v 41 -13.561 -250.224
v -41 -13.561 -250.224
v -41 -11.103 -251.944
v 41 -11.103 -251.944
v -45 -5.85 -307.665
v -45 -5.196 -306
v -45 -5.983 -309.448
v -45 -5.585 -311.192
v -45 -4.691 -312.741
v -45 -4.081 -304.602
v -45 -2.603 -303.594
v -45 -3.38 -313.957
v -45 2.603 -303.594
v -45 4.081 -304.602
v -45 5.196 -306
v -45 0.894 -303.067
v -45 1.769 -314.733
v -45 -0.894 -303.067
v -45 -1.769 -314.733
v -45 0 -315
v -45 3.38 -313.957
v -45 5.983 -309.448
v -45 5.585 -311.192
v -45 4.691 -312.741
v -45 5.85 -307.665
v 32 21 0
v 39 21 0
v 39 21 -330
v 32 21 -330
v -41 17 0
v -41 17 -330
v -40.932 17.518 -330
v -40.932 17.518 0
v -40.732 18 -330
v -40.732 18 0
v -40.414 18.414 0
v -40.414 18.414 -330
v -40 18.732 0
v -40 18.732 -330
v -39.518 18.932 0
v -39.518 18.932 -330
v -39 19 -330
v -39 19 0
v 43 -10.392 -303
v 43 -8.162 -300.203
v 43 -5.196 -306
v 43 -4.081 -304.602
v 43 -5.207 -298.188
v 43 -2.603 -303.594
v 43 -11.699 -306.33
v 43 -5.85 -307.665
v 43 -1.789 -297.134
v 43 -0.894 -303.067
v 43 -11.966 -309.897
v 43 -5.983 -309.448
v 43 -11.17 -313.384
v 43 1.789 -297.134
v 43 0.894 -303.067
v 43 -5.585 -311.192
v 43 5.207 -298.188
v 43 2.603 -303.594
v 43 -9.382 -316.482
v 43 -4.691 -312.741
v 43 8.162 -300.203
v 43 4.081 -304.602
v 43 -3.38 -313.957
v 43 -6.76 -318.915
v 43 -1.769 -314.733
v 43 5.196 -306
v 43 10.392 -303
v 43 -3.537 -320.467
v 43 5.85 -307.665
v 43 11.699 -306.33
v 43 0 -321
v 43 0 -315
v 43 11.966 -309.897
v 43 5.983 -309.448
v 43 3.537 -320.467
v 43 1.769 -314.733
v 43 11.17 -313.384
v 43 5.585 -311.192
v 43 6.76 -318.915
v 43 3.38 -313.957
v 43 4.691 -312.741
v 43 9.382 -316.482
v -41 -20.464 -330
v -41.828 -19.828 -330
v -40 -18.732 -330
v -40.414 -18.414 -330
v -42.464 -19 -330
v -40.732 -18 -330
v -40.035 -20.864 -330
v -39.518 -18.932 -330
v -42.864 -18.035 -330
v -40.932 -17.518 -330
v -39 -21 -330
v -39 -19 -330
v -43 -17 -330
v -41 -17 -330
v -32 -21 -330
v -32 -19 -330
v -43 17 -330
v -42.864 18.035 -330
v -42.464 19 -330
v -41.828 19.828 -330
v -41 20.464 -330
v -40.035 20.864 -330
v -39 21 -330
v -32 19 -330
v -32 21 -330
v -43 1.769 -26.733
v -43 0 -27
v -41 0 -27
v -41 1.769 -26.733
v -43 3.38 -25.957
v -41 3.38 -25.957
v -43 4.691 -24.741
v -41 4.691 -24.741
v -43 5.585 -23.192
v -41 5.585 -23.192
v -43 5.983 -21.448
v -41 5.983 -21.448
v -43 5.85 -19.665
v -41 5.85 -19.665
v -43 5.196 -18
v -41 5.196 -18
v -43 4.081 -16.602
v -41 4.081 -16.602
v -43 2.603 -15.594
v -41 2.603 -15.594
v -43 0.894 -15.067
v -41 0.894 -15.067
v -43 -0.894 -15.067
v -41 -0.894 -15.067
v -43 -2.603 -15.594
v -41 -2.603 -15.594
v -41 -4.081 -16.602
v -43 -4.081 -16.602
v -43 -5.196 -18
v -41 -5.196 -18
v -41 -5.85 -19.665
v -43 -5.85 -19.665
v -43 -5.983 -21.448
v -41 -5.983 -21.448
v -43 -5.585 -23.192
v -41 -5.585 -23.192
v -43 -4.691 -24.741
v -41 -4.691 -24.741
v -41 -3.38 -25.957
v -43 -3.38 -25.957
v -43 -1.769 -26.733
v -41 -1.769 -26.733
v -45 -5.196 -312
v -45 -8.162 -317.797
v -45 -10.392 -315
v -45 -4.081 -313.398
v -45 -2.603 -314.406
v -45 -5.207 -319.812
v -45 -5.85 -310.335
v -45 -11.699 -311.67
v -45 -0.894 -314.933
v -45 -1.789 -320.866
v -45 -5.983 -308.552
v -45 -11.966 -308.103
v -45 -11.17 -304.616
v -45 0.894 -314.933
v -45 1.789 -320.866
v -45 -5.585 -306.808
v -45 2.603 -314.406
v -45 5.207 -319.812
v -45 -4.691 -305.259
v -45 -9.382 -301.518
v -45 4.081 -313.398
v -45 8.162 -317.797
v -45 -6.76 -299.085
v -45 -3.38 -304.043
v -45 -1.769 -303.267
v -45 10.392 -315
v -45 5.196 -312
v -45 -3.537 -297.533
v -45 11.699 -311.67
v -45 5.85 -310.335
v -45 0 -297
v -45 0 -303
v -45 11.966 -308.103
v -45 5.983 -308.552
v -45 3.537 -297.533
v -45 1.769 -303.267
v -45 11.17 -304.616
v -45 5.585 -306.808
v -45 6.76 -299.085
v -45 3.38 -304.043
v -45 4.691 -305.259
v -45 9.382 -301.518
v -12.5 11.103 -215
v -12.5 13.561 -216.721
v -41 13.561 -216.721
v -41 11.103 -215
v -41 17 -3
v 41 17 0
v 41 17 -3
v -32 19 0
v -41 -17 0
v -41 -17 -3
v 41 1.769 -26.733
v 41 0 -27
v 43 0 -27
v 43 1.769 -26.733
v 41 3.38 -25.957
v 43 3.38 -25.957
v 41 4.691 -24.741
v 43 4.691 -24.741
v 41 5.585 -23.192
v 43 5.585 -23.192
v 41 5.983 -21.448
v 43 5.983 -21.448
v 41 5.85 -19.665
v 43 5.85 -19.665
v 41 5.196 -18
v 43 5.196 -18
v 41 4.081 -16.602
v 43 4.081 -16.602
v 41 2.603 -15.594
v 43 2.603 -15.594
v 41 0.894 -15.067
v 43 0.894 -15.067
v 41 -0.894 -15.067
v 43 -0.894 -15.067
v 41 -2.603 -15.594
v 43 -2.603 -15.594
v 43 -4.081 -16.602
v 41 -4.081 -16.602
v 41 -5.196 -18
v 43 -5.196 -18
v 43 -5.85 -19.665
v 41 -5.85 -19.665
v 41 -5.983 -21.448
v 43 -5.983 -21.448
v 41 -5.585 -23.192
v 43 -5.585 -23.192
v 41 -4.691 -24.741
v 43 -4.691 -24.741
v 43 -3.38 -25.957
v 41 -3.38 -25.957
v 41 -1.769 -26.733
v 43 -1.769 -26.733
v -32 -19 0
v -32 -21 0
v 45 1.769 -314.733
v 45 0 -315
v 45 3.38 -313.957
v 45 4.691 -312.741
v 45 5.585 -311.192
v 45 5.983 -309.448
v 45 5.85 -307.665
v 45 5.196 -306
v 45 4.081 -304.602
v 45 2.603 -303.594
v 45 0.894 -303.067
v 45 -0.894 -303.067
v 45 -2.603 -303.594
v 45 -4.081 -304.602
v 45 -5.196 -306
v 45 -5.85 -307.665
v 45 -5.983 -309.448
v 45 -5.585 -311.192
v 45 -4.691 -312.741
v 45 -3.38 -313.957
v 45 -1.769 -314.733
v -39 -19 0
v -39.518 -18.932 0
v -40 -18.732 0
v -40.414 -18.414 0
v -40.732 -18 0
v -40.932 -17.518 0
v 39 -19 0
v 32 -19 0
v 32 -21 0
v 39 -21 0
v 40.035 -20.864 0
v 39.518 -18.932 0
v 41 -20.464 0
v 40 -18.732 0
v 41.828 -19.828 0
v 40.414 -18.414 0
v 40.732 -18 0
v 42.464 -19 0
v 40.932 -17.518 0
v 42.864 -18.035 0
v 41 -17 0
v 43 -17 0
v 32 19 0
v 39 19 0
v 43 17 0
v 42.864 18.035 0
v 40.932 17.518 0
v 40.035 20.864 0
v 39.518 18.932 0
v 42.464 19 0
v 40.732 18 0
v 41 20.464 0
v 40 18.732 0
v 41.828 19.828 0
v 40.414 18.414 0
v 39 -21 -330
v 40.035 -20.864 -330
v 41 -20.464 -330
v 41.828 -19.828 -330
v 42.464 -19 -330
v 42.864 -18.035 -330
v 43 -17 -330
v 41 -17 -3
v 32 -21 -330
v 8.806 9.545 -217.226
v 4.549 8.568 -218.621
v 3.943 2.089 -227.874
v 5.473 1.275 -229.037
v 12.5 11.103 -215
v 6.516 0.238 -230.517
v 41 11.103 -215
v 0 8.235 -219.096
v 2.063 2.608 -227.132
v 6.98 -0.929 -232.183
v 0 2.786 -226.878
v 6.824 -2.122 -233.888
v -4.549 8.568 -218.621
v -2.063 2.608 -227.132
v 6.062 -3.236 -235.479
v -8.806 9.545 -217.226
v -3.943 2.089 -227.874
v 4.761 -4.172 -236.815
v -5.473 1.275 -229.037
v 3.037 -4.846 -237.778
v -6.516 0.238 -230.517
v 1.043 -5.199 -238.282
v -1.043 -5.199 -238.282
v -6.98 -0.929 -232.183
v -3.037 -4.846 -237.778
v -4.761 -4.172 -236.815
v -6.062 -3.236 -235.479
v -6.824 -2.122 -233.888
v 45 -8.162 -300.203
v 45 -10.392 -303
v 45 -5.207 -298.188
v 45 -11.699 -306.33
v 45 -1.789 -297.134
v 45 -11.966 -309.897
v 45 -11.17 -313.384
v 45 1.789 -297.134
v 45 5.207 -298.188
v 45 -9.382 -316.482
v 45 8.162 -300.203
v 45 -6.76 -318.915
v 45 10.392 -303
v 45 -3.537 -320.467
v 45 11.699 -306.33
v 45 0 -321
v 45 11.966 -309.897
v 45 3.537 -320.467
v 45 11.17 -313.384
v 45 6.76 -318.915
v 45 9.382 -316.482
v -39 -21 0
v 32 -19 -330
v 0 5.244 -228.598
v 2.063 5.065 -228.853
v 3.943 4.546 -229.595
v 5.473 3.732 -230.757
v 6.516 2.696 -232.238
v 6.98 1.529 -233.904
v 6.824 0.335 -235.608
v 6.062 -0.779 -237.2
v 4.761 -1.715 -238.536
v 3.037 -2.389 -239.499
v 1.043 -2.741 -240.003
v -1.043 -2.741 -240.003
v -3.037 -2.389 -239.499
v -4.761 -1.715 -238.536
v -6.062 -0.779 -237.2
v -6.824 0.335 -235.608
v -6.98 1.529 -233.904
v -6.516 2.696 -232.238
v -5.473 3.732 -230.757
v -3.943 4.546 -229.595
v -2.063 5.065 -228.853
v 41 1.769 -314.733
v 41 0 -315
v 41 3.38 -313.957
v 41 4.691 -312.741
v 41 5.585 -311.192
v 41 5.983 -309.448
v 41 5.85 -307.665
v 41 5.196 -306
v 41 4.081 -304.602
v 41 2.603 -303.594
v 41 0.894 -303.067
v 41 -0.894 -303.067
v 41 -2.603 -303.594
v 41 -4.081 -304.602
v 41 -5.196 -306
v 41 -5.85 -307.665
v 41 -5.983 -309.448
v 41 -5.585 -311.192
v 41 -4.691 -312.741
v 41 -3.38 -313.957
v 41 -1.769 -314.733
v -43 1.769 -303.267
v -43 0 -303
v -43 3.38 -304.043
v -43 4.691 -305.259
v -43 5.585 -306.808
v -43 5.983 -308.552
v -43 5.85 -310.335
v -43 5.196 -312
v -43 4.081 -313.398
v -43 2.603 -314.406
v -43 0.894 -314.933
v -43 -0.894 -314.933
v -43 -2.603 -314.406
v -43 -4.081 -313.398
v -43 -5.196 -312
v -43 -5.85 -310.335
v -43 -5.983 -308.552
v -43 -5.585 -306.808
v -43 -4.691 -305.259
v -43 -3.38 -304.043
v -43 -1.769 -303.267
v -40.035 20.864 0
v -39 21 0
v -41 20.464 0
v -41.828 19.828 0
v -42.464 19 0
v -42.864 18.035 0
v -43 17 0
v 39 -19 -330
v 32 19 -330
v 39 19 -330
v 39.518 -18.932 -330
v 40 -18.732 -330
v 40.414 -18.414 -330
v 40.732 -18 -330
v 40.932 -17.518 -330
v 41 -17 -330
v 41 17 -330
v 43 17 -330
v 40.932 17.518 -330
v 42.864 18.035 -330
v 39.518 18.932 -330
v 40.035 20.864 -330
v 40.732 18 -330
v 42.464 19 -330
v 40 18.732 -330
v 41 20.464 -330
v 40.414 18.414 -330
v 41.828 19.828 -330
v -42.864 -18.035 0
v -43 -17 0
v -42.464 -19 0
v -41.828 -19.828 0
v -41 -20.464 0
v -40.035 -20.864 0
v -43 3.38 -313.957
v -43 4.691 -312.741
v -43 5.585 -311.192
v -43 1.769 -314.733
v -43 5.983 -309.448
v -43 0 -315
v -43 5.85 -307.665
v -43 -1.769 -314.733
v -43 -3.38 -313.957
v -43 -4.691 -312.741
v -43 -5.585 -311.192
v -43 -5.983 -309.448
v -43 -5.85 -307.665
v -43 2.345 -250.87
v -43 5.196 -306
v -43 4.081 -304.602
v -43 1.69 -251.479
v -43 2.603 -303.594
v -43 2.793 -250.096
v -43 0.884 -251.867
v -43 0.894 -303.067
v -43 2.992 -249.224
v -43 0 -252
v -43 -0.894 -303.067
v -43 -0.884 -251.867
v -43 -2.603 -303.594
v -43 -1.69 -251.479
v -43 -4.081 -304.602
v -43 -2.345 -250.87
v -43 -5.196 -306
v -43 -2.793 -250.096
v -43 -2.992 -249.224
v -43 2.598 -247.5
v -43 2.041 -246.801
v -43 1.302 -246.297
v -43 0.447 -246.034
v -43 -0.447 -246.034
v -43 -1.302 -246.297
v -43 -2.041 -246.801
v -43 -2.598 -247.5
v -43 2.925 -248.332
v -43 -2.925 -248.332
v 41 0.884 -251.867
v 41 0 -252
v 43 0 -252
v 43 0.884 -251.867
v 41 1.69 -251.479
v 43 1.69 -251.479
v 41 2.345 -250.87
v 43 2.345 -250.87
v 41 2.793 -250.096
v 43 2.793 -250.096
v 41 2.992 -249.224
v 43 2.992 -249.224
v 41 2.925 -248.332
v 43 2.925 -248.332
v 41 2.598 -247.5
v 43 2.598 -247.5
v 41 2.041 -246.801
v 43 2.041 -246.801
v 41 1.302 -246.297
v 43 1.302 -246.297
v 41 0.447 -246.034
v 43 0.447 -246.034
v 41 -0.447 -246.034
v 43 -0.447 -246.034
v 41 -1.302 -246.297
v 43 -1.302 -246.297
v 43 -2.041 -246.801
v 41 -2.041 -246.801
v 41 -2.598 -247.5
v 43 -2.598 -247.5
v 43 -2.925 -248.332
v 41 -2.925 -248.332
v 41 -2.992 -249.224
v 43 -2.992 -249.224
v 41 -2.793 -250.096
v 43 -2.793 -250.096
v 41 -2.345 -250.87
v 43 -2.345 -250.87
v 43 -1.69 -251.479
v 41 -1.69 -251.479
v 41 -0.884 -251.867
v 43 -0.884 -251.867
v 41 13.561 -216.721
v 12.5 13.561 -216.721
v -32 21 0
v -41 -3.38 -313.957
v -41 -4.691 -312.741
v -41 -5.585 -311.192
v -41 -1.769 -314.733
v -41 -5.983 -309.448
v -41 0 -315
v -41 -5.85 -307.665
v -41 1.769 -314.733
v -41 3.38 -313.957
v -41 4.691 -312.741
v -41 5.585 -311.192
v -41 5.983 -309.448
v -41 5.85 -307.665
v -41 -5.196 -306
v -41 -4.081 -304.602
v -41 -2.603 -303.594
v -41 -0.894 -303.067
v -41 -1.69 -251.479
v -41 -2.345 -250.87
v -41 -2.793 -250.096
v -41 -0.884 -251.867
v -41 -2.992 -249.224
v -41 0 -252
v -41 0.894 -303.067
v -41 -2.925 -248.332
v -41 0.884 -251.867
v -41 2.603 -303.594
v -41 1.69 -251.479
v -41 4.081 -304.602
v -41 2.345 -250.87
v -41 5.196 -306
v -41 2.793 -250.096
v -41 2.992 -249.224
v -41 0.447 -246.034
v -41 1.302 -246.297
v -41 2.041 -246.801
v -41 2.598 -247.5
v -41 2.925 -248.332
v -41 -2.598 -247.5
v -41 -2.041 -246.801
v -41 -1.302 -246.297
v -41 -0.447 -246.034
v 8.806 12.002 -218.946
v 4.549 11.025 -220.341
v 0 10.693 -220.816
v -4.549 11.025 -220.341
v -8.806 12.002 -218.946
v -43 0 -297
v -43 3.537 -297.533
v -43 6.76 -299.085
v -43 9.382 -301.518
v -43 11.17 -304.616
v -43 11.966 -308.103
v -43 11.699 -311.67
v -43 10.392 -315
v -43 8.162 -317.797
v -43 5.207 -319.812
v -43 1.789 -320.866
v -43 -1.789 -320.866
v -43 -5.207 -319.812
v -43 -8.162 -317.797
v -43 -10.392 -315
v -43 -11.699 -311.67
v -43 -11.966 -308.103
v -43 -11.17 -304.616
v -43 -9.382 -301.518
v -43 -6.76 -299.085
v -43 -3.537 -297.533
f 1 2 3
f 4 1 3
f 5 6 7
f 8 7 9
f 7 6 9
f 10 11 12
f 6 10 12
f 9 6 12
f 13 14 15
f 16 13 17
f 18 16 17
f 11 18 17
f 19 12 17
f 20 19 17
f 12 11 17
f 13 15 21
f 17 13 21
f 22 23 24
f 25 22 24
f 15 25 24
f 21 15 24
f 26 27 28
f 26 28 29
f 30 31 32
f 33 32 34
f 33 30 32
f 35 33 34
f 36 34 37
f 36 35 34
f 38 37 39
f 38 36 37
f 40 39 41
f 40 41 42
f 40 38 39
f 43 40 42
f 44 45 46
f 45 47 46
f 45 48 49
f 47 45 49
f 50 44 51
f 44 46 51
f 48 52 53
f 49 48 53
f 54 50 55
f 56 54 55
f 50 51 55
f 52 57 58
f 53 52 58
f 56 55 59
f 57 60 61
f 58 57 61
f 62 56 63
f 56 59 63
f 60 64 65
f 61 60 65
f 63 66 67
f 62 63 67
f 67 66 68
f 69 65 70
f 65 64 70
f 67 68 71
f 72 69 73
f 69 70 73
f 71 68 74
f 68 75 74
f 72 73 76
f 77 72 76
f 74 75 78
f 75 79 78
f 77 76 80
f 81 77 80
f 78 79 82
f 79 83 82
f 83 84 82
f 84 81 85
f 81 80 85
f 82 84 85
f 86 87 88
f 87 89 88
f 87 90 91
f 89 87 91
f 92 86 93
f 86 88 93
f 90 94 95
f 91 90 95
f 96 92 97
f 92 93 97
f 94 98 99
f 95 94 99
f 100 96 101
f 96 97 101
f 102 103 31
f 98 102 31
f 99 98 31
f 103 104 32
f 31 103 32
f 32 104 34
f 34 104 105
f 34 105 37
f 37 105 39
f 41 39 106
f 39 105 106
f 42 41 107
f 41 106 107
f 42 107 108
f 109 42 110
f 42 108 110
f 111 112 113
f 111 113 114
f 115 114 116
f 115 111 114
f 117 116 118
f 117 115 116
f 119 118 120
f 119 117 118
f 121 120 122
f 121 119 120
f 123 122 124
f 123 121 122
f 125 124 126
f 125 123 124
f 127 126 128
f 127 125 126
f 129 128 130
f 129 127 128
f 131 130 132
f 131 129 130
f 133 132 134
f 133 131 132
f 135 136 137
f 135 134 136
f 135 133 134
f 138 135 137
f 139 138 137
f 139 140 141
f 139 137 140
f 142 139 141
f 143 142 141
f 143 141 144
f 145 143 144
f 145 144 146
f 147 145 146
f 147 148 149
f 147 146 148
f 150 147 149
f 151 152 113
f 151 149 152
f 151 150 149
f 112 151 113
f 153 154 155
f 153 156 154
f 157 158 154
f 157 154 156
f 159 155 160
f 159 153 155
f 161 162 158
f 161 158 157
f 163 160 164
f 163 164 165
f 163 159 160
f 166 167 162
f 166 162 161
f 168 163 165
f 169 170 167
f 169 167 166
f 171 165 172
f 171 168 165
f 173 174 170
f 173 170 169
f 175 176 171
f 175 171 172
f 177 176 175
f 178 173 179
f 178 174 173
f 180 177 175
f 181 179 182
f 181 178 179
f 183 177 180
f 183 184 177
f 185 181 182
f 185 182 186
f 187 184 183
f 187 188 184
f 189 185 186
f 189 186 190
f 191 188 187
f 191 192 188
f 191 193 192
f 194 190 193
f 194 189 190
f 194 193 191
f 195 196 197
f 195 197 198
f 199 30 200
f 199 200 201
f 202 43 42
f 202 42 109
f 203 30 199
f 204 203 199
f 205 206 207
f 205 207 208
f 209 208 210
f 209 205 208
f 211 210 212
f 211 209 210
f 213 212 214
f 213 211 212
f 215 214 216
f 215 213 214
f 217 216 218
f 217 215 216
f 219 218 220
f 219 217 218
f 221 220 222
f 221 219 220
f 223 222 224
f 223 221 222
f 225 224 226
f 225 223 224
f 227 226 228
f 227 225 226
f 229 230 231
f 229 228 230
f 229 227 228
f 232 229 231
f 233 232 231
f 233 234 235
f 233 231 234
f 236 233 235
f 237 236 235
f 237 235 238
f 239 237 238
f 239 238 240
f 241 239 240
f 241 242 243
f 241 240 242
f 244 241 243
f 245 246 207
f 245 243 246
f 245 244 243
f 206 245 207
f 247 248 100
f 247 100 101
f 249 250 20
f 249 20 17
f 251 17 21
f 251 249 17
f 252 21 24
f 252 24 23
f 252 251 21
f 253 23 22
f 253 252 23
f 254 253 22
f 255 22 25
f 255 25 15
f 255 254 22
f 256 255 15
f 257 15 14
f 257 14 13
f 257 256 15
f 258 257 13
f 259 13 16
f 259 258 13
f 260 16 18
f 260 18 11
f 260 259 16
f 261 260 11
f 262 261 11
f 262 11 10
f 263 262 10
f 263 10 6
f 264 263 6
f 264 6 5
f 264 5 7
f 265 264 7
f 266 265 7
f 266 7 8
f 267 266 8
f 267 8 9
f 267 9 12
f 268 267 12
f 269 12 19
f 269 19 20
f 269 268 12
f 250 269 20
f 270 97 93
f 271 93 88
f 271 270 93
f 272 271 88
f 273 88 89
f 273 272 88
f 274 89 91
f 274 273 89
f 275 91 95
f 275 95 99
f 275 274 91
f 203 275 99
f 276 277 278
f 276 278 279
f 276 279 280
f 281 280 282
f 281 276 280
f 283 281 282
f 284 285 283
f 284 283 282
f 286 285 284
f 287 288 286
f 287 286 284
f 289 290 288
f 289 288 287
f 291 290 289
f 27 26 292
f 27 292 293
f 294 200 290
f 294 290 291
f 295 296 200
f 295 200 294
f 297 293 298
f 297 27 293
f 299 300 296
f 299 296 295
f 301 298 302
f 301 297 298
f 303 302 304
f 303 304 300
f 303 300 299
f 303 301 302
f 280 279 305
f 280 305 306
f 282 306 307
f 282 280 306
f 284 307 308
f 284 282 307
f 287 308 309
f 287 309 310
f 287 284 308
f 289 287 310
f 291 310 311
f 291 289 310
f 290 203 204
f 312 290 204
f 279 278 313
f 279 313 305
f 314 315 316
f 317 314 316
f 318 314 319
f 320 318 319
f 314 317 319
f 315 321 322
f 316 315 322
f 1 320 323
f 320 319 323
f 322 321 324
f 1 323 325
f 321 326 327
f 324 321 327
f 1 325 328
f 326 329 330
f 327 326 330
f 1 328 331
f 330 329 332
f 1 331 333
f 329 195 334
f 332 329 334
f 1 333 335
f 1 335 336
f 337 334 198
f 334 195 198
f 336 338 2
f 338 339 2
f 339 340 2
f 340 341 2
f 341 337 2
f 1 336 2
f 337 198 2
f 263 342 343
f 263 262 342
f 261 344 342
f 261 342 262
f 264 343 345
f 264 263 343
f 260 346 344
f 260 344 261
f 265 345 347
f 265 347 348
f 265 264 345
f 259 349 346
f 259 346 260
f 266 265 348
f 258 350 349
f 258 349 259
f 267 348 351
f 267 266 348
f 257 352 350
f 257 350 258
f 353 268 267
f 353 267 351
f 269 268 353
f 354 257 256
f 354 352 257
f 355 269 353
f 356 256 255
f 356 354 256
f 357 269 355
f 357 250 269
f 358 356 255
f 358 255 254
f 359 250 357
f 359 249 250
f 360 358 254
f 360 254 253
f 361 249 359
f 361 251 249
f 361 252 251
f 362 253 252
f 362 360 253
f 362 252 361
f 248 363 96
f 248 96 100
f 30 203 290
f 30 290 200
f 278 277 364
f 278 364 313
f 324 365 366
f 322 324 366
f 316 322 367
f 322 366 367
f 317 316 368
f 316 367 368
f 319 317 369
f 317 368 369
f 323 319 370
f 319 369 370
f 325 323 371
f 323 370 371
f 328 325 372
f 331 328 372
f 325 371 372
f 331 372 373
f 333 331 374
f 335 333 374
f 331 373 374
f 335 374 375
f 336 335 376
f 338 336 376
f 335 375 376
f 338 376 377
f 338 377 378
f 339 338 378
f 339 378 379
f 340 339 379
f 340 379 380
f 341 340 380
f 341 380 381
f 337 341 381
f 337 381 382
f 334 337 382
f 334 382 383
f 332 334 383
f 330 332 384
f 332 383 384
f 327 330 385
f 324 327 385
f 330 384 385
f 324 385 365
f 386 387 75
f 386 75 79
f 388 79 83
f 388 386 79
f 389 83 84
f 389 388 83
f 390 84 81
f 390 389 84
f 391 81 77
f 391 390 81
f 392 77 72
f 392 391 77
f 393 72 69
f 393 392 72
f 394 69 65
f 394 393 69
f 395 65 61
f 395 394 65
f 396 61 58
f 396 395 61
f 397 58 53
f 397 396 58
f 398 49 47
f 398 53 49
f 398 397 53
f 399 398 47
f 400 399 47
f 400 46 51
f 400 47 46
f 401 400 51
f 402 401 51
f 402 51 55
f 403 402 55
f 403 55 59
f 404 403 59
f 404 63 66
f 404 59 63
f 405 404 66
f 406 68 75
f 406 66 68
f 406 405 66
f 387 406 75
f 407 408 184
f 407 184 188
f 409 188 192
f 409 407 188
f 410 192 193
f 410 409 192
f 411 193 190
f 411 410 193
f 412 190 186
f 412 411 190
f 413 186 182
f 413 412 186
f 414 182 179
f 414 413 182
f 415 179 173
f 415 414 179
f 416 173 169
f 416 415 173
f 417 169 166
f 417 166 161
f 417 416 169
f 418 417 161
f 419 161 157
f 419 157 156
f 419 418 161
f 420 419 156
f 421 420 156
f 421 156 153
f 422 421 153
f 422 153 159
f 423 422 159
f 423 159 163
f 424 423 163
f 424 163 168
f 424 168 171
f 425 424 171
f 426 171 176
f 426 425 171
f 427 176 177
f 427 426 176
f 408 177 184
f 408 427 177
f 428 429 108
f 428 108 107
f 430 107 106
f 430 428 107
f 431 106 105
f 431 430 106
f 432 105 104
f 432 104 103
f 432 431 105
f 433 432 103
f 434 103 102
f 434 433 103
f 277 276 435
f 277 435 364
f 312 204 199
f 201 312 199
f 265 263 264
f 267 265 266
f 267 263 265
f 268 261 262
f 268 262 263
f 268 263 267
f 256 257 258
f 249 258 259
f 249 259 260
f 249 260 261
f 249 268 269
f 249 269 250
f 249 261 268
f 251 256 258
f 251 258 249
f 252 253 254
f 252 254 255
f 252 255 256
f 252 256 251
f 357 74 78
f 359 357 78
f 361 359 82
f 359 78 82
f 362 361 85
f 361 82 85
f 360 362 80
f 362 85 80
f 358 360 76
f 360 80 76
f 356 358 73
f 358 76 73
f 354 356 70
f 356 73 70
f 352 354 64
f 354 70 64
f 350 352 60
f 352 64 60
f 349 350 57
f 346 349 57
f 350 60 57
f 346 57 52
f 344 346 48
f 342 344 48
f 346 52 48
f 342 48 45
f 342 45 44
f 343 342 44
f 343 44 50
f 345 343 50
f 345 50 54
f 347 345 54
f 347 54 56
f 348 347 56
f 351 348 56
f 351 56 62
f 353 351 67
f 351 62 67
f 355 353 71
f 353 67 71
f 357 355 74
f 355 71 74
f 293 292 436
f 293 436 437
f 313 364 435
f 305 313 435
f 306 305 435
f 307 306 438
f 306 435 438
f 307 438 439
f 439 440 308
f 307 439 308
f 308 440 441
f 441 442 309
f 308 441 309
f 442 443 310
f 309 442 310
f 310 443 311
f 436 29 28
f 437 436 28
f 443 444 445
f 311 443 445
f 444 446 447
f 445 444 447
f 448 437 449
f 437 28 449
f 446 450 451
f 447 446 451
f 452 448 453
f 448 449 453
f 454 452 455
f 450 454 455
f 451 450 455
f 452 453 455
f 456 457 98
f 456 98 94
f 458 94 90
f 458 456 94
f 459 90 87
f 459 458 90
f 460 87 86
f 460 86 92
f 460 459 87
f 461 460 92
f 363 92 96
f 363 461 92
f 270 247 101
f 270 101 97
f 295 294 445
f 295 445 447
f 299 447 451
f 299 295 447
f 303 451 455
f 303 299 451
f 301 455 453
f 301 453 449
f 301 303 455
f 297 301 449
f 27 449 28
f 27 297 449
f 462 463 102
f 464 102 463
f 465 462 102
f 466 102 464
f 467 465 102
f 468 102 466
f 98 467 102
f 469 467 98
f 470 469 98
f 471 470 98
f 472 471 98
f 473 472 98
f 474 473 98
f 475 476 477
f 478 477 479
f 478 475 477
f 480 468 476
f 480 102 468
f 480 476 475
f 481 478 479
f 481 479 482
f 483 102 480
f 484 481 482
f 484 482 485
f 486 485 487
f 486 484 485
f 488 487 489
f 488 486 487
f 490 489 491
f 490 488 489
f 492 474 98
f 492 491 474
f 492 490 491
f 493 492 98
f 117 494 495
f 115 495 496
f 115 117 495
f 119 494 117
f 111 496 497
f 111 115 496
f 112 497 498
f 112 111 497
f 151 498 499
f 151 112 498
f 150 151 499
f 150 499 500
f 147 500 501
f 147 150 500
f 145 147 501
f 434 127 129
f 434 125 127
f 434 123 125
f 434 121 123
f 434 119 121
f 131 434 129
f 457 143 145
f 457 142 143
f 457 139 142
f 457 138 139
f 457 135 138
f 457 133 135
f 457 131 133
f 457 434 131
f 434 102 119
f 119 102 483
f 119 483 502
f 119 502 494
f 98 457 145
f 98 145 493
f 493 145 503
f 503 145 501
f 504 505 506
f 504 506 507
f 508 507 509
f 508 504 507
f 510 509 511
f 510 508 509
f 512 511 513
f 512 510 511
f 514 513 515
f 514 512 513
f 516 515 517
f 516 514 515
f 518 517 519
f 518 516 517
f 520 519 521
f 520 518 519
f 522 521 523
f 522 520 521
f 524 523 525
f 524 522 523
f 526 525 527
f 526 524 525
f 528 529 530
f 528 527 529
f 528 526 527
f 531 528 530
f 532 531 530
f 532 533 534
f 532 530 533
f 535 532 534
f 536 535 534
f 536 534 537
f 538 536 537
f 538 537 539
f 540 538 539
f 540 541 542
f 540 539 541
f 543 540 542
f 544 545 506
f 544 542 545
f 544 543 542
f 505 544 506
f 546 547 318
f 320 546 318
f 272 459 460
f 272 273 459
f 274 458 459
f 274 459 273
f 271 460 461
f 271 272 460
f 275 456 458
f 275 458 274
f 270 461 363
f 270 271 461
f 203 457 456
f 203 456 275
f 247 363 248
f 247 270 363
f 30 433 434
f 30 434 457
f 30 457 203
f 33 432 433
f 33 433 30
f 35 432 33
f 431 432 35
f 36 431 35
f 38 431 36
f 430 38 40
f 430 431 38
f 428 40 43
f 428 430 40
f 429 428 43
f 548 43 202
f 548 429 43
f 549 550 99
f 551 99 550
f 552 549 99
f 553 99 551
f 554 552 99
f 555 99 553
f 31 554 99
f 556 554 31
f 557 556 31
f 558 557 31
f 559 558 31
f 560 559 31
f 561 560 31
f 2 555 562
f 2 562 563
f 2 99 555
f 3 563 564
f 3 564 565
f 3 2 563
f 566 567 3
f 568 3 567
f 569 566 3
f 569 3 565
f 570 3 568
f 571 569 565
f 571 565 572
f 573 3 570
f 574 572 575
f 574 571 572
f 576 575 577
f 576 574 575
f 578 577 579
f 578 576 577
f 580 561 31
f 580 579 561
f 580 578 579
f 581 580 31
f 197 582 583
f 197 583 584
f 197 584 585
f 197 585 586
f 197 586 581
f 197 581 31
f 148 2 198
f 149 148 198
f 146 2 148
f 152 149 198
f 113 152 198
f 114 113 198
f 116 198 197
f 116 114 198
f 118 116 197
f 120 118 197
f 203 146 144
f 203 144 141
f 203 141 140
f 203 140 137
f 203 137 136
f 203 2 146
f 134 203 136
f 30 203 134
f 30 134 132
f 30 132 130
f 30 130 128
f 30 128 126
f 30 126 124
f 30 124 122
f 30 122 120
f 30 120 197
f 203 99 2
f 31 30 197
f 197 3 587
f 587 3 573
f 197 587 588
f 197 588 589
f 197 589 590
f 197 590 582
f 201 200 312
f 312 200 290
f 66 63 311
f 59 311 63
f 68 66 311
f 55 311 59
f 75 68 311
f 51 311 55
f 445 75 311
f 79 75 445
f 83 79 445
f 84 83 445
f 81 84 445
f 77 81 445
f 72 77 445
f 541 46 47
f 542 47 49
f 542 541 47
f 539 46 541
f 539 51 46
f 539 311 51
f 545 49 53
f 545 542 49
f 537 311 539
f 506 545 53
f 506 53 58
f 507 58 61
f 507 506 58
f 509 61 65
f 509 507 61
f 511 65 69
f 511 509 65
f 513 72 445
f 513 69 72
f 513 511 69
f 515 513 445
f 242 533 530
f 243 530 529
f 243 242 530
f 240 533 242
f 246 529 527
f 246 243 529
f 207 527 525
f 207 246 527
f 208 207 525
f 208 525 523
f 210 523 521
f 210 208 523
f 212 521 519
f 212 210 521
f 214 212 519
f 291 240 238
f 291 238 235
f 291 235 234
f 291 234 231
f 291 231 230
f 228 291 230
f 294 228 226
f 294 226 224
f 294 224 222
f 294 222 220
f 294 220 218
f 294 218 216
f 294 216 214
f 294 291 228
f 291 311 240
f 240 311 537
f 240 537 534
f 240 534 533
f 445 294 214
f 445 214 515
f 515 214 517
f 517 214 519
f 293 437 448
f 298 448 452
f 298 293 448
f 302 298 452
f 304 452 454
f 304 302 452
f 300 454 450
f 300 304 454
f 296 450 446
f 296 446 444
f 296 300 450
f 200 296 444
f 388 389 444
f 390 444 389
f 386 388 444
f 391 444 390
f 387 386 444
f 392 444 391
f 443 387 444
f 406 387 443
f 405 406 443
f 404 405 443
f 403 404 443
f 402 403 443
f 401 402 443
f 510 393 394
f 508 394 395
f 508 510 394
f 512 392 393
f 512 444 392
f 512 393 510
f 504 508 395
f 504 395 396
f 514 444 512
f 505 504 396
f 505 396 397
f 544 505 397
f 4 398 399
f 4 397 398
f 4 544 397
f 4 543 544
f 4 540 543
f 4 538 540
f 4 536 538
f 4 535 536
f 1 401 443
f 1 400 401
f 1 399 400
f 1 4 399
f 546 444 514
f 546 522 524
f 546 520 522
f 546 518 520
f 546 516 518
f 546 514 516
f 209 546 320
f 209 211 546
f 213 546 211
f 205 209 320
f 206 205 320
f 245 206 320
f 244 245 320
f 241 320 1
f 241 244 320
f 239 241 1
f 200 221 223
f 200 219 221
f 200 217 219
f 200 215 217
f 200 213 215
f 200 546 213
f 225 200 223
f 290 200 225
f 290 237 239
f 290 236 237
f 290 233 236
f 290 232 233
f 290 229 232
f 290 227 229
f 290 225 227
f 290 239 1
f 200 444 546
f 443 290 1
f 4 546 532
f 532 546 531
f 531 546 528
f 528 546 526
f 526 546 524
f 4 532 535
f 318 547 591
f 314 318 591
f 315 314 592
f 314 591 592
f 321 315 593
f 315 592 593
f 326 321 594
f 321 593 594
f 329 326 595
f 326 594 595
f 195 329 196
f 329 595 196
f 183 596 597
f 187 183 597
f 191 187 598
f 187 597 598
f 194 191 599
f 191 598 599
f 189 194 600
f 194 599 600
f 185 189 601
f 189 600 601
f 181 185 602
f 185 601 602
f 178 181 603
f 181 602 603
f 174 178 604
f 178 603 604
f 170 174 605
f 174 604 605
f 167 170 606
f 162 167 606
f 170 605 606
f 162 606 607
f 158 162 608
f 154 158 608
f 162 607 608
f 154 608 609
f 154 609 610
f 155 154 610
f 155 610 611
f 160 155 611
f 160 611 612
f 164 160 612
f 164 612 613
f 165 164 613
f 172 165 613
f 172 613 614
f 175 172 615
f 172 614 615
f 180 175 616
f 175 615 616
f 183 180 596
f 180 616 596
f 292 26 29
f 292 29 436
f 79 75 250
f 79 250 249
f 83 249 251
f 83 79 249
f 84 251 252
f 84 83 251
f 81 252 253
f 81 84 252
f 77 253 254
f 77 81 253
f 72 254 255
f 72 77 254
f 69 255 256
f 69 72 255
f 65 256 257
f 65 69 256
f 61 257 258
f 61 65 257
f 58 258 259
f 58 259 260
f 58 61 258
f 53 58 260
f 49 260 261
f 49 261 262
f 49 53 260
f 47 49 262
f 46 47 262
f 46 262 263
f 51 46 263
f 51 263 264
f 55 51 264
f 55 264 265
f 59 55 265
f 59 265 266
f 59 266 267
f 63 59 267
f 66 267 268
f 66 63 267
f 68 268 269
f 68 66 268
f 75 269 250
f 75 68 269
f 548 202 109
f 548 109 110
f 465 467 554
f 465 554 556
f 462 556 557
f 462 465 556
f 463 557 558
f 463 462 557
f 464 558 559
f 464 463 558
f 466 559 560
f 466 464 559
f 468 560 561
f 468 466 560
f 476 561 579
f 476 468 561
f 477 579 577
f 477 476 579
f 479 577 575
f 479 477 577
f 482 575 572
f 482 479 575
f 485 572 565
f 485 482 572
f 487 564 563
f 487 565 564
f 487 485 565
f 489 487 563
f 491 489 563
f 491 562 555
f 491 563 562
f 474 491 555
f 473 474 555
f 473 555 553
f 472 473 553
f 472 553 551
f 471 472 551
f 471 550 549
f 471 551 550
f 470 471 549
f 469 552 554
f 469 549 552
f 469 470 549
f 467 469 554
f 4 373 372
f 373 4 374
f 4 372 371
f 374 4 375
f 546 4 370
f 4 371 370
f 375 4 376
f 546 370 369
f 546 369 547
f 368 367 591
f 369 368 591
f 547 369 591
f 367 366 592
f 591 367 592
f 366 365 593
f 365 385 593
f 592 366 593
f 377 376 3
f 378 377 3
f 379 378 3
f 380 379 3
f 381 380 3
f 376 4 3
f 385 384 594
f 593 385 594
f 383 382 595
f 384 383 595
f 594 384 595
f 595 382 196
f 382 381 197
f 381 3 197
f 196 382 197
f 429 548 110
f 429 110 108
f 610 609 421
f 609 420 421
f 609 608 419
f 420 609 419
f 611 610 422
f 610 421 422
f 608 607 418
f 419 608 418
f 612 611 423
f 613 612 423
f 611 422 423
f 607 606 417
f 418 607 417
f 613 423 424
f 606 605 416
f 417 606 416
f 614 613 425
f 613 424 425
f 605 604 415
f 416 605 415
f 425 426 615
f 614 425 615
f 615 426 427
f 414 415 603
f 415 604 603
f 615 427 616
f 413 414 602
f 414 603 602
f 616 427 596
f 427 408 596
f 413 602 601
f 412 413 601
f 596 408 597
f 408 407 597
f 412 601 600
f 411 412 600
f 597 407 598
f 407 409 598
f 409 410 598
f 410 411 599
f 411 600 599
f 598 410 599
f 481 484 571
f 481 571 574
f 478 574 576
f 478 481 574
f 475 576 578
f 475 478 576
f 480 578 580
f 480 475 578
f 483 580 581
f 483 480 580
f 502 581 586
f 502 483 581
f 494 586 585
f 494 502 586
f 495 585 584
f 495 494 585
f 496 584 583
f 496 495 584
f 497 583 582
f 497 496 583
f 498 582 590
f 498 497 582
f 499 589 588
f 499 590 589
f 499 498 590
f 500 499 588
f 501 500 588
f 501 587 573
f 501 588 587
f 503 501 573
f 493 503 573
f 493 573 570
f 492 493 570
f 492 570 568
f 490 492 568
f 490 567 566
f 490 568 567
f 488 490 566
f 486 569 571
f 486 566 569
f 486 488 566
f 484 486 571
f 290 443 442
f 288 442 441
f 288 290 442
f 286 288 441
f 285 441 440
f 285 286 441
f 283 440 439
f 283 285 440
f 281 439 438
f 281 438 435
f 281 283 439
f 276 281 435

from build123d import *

# Parameters (mm, degrees)
EXTRUDE_1_DEPTH          = 330
EXTRUDE_1_2_DEPTH        = 330
EXTRUDE_2_REACH          = 343.17
SKETCH_3_W               = 3
SKETCH_3_H               = 34
EXTRUDE_3_REACH          = 343.17
CUT_EXTRUDE_1_DEPTH      = 342.667967477
CUT_EXTRUDE_1_DEPTH_BACK = 342.667967477
SKETCH_5_R               = 6
SKETCH_5_R_2             = 3
SKETCH_6_R               = 7
CUT_EXTRUDE_2_DEPTH      = 3
SKETCH_7_R               = 12
SKETCH_7_R_2             = 6
EXTRUDE_4_DEPTH          = 2
SKETCH_8_R               = 6
EXTRUDE_5_DEPTH          = 90
SKETCH_9_R               = 12
SKETCH_9_R_2             = 6
EXTRUDE_6_DEPTH          = 2


with BuildPart() as part:
    # Эскиз2 → Бобышка-Вытянуть1 (new body)
    with BuildSketch(Plane.XY):
        with BuildLine():
            Line((43, -17), (43, 17))
            ThreePointArc((43, 17), (41.828427125, 19.828427125), (39, 21))
            Line((39, 21), (32, 21))
            Line((32, 21), (32, 19))
            Line((32, 19), (39, 19))
            ThreePointArc((39, 19), (40.414213562, 18.414213562), (41, 17))
            Line((41, 17), (41, -17))
            ThreePointArc((41, -17), (40.414213562, -18.414213562), (39, -19))
            Line((39, -19), (32, -19))
            Line((32, -19), (32, -21))
            Line((32, -21), (39, -21))
            ThreePointArc((39, -21), (41.828427125, -19.828427125), (43, -17))
        make_face()
    extrude(amount=-EXTRUDE_1_DEPTH)


with BuildPart() as body_2:
    # Эскиз2 → Extrude 1 2 (new body)
    with BuildSketch(Plane.XY):
        with BuildLine():
            Line((-32, 19), (-32, 21))
            Line((-32, 21), (-39, 21))
            ThreePointArc((-39, 21), (-41.828427125, 19.828427125), (-43, 17))
            Line((-43, 17), (-43, -17))
            ThreePointArc((-43, -17), (-41.828427125, -19.828427125), (-39, -21))
            Line((-39, -21), (-32, -21))
            Line((-32, -21), (-32, -19))
            Line((-32, -19), (-39, -19))
            ThreePointArc((-39, -19), (-40.414213562, -18.414213562), (-41, -17))
            Line((-41, -17), (-41, 17))
            ThreePointArc((-41, 17), (-40.414213562, 18.414213562), (-39, 19))
            Line((-39, 19), (-32, 19))
        make_face()
    extrude(amount=-EXTRUDE_1_2_DEPTH)


with BuildPart() as body_3:

    # Эскиз3 → Бобышка-Вытянуть2 (new, up to next)
    with BuildSketch(Plane(origin=(-41, 0, 0), x_dir=(0, 0, -1), z_dir=(1, 0, 0)), mode=Mode.PRIVATE) as extrude_2_sk1:
        with Locations((1.5, 0)):
            Rectangle(SKETCH_3_W, SKETCH_3_H)
    extrude_2_tool1 = extrude(extrude_2_sk1.sketch, amount=EXTRUDE_2_REACH, mode=Mode.PRIVATE) - part.part
    add(extrude_2_tool1.solids().sort_by_distance((-41, 0, -1.5))[0])


with BuildPart() as part_1:
    add(part.part)

    # Эскиз4 → Бобышка-Вытянуть3 (add, up to next)
    with BuildSketch(Plane(origin=(-41, 0, 0), x_dir=(0, 0, -1), z_dir=(1, 0, 0)), mode=Mode.PRIVATE) as extrude_3_sk1:
        Polygon((215, 11.103165315), (250.223537904, -13.560621448), (251.944267213, -11.103165315), (216.720729309, 13.560621448), align=None)
    extrude_3_tool1 = extrude(extrude_3_sk1.sketch, amount=EXTRUDE_3_REACH, mode=Mode.PRIVATE) - part_1.part

    add(body_2.part)  # Бобышка-Вытянуть3 merges body 2
    add(extrude_3_tool1.solids().sort_by_distance((-41, 0, -233.472134))[0])

    # Эскиз5 → Вырез-Вытянуть1 (cut, two sides: drawn at the far end of the back side and taken through both)
    with BuildSketch(Plane(origin=(43, 0, 0), x_dir=(0, 0, -1), z_dir=(1, 0, 0)).offset(-CUT_EXTRUDE_1_DEPTH_BACK)):
        with Locations((309, 0)):
            Circle(SKETCH_5_R)
        with Locations((21, 0)):
            Circle(SKETCH_5_R)
        with Locations((249, 0)):
            Circle(SKETCH_5_R_2)
    extrude(amount=CUT_EXTRUDE_1_DEPTH + CUT_EXTRUDE_1_DEPTH_BACK, mode=Mode.SUBTRACT)

    # Эскиз6 → Вырез-Вытянуть2 (cut)
    with BuildSketch(Plane(origin=(0, 110.924748621, -77.670345159), x_dir=(1, 0, 0), z_dir=(0, 0.8191520442889955, -0.5735764363510407))):
        with Locations(Location((0, 191.249175528, 0), (0, 0, 270))):
            Circle(SKETCH_6_R)
        with BuildLine():
            Line((-12.5, 169.749175528), (12.5, 169.749175528))
            ThreePointArc((12.5, 169.749175528), (0, 174.749175528), (-12.5, 169.749175528))
        make_face()
    extrude(amount=-CUT_EXTRUDE_2_DEPTH, mode=Mode.SUBTRACT)


with BuildPart() as body_3_2:
    # Эскиз7 → Бобышка-Вытянуть4 (new body)
    with BuildSketch(Plane(origin=(43, 0, 0), x_dir=(0, 0, -1), z_dir=(1, 0, 0))):
        with Locations((309, 0)):
            Circle(SKETCH_7_R)
        with Locations((309, 0)):
            Circle(SKETCH_7_R_2, mode=Mode.SUBTRACT)
    extrude(amount=EXTRUDE_4_DEPTH)


with BuildPart() as body_4:
    # Эскиз8 → Бобышка-Вытянуть5 (new body)
    with BuildSketch(Plane(origin=(45, 0, 0), x_dir=(0, 0, -1), z_dir=(1, 0, 0))):
        with Locations((309, 0)):
            Circle(SKETCH_8_R)
    extrude(amount=-EXTRUDE_5_DEPTH)


with BuildPart() as body_5:
    # Эскиз9 → Бобышка-Вытянуть6 (new body)
    with BuildSketch(Plane.ZY.offset(43)):
        with Locations((-309, 0)):
            Circle(SKETCH_9_R)
        with Locations((-309, 0)):
            Circle(SKETCH_9_R_2, mode=Mode.SUBTRACT)
    extrude(amount=EXTRUDE_6_DEPTH)


solid = Compound([body_3.part, part_1.part, body_3_2.part, body_4.part, body_5.part])
